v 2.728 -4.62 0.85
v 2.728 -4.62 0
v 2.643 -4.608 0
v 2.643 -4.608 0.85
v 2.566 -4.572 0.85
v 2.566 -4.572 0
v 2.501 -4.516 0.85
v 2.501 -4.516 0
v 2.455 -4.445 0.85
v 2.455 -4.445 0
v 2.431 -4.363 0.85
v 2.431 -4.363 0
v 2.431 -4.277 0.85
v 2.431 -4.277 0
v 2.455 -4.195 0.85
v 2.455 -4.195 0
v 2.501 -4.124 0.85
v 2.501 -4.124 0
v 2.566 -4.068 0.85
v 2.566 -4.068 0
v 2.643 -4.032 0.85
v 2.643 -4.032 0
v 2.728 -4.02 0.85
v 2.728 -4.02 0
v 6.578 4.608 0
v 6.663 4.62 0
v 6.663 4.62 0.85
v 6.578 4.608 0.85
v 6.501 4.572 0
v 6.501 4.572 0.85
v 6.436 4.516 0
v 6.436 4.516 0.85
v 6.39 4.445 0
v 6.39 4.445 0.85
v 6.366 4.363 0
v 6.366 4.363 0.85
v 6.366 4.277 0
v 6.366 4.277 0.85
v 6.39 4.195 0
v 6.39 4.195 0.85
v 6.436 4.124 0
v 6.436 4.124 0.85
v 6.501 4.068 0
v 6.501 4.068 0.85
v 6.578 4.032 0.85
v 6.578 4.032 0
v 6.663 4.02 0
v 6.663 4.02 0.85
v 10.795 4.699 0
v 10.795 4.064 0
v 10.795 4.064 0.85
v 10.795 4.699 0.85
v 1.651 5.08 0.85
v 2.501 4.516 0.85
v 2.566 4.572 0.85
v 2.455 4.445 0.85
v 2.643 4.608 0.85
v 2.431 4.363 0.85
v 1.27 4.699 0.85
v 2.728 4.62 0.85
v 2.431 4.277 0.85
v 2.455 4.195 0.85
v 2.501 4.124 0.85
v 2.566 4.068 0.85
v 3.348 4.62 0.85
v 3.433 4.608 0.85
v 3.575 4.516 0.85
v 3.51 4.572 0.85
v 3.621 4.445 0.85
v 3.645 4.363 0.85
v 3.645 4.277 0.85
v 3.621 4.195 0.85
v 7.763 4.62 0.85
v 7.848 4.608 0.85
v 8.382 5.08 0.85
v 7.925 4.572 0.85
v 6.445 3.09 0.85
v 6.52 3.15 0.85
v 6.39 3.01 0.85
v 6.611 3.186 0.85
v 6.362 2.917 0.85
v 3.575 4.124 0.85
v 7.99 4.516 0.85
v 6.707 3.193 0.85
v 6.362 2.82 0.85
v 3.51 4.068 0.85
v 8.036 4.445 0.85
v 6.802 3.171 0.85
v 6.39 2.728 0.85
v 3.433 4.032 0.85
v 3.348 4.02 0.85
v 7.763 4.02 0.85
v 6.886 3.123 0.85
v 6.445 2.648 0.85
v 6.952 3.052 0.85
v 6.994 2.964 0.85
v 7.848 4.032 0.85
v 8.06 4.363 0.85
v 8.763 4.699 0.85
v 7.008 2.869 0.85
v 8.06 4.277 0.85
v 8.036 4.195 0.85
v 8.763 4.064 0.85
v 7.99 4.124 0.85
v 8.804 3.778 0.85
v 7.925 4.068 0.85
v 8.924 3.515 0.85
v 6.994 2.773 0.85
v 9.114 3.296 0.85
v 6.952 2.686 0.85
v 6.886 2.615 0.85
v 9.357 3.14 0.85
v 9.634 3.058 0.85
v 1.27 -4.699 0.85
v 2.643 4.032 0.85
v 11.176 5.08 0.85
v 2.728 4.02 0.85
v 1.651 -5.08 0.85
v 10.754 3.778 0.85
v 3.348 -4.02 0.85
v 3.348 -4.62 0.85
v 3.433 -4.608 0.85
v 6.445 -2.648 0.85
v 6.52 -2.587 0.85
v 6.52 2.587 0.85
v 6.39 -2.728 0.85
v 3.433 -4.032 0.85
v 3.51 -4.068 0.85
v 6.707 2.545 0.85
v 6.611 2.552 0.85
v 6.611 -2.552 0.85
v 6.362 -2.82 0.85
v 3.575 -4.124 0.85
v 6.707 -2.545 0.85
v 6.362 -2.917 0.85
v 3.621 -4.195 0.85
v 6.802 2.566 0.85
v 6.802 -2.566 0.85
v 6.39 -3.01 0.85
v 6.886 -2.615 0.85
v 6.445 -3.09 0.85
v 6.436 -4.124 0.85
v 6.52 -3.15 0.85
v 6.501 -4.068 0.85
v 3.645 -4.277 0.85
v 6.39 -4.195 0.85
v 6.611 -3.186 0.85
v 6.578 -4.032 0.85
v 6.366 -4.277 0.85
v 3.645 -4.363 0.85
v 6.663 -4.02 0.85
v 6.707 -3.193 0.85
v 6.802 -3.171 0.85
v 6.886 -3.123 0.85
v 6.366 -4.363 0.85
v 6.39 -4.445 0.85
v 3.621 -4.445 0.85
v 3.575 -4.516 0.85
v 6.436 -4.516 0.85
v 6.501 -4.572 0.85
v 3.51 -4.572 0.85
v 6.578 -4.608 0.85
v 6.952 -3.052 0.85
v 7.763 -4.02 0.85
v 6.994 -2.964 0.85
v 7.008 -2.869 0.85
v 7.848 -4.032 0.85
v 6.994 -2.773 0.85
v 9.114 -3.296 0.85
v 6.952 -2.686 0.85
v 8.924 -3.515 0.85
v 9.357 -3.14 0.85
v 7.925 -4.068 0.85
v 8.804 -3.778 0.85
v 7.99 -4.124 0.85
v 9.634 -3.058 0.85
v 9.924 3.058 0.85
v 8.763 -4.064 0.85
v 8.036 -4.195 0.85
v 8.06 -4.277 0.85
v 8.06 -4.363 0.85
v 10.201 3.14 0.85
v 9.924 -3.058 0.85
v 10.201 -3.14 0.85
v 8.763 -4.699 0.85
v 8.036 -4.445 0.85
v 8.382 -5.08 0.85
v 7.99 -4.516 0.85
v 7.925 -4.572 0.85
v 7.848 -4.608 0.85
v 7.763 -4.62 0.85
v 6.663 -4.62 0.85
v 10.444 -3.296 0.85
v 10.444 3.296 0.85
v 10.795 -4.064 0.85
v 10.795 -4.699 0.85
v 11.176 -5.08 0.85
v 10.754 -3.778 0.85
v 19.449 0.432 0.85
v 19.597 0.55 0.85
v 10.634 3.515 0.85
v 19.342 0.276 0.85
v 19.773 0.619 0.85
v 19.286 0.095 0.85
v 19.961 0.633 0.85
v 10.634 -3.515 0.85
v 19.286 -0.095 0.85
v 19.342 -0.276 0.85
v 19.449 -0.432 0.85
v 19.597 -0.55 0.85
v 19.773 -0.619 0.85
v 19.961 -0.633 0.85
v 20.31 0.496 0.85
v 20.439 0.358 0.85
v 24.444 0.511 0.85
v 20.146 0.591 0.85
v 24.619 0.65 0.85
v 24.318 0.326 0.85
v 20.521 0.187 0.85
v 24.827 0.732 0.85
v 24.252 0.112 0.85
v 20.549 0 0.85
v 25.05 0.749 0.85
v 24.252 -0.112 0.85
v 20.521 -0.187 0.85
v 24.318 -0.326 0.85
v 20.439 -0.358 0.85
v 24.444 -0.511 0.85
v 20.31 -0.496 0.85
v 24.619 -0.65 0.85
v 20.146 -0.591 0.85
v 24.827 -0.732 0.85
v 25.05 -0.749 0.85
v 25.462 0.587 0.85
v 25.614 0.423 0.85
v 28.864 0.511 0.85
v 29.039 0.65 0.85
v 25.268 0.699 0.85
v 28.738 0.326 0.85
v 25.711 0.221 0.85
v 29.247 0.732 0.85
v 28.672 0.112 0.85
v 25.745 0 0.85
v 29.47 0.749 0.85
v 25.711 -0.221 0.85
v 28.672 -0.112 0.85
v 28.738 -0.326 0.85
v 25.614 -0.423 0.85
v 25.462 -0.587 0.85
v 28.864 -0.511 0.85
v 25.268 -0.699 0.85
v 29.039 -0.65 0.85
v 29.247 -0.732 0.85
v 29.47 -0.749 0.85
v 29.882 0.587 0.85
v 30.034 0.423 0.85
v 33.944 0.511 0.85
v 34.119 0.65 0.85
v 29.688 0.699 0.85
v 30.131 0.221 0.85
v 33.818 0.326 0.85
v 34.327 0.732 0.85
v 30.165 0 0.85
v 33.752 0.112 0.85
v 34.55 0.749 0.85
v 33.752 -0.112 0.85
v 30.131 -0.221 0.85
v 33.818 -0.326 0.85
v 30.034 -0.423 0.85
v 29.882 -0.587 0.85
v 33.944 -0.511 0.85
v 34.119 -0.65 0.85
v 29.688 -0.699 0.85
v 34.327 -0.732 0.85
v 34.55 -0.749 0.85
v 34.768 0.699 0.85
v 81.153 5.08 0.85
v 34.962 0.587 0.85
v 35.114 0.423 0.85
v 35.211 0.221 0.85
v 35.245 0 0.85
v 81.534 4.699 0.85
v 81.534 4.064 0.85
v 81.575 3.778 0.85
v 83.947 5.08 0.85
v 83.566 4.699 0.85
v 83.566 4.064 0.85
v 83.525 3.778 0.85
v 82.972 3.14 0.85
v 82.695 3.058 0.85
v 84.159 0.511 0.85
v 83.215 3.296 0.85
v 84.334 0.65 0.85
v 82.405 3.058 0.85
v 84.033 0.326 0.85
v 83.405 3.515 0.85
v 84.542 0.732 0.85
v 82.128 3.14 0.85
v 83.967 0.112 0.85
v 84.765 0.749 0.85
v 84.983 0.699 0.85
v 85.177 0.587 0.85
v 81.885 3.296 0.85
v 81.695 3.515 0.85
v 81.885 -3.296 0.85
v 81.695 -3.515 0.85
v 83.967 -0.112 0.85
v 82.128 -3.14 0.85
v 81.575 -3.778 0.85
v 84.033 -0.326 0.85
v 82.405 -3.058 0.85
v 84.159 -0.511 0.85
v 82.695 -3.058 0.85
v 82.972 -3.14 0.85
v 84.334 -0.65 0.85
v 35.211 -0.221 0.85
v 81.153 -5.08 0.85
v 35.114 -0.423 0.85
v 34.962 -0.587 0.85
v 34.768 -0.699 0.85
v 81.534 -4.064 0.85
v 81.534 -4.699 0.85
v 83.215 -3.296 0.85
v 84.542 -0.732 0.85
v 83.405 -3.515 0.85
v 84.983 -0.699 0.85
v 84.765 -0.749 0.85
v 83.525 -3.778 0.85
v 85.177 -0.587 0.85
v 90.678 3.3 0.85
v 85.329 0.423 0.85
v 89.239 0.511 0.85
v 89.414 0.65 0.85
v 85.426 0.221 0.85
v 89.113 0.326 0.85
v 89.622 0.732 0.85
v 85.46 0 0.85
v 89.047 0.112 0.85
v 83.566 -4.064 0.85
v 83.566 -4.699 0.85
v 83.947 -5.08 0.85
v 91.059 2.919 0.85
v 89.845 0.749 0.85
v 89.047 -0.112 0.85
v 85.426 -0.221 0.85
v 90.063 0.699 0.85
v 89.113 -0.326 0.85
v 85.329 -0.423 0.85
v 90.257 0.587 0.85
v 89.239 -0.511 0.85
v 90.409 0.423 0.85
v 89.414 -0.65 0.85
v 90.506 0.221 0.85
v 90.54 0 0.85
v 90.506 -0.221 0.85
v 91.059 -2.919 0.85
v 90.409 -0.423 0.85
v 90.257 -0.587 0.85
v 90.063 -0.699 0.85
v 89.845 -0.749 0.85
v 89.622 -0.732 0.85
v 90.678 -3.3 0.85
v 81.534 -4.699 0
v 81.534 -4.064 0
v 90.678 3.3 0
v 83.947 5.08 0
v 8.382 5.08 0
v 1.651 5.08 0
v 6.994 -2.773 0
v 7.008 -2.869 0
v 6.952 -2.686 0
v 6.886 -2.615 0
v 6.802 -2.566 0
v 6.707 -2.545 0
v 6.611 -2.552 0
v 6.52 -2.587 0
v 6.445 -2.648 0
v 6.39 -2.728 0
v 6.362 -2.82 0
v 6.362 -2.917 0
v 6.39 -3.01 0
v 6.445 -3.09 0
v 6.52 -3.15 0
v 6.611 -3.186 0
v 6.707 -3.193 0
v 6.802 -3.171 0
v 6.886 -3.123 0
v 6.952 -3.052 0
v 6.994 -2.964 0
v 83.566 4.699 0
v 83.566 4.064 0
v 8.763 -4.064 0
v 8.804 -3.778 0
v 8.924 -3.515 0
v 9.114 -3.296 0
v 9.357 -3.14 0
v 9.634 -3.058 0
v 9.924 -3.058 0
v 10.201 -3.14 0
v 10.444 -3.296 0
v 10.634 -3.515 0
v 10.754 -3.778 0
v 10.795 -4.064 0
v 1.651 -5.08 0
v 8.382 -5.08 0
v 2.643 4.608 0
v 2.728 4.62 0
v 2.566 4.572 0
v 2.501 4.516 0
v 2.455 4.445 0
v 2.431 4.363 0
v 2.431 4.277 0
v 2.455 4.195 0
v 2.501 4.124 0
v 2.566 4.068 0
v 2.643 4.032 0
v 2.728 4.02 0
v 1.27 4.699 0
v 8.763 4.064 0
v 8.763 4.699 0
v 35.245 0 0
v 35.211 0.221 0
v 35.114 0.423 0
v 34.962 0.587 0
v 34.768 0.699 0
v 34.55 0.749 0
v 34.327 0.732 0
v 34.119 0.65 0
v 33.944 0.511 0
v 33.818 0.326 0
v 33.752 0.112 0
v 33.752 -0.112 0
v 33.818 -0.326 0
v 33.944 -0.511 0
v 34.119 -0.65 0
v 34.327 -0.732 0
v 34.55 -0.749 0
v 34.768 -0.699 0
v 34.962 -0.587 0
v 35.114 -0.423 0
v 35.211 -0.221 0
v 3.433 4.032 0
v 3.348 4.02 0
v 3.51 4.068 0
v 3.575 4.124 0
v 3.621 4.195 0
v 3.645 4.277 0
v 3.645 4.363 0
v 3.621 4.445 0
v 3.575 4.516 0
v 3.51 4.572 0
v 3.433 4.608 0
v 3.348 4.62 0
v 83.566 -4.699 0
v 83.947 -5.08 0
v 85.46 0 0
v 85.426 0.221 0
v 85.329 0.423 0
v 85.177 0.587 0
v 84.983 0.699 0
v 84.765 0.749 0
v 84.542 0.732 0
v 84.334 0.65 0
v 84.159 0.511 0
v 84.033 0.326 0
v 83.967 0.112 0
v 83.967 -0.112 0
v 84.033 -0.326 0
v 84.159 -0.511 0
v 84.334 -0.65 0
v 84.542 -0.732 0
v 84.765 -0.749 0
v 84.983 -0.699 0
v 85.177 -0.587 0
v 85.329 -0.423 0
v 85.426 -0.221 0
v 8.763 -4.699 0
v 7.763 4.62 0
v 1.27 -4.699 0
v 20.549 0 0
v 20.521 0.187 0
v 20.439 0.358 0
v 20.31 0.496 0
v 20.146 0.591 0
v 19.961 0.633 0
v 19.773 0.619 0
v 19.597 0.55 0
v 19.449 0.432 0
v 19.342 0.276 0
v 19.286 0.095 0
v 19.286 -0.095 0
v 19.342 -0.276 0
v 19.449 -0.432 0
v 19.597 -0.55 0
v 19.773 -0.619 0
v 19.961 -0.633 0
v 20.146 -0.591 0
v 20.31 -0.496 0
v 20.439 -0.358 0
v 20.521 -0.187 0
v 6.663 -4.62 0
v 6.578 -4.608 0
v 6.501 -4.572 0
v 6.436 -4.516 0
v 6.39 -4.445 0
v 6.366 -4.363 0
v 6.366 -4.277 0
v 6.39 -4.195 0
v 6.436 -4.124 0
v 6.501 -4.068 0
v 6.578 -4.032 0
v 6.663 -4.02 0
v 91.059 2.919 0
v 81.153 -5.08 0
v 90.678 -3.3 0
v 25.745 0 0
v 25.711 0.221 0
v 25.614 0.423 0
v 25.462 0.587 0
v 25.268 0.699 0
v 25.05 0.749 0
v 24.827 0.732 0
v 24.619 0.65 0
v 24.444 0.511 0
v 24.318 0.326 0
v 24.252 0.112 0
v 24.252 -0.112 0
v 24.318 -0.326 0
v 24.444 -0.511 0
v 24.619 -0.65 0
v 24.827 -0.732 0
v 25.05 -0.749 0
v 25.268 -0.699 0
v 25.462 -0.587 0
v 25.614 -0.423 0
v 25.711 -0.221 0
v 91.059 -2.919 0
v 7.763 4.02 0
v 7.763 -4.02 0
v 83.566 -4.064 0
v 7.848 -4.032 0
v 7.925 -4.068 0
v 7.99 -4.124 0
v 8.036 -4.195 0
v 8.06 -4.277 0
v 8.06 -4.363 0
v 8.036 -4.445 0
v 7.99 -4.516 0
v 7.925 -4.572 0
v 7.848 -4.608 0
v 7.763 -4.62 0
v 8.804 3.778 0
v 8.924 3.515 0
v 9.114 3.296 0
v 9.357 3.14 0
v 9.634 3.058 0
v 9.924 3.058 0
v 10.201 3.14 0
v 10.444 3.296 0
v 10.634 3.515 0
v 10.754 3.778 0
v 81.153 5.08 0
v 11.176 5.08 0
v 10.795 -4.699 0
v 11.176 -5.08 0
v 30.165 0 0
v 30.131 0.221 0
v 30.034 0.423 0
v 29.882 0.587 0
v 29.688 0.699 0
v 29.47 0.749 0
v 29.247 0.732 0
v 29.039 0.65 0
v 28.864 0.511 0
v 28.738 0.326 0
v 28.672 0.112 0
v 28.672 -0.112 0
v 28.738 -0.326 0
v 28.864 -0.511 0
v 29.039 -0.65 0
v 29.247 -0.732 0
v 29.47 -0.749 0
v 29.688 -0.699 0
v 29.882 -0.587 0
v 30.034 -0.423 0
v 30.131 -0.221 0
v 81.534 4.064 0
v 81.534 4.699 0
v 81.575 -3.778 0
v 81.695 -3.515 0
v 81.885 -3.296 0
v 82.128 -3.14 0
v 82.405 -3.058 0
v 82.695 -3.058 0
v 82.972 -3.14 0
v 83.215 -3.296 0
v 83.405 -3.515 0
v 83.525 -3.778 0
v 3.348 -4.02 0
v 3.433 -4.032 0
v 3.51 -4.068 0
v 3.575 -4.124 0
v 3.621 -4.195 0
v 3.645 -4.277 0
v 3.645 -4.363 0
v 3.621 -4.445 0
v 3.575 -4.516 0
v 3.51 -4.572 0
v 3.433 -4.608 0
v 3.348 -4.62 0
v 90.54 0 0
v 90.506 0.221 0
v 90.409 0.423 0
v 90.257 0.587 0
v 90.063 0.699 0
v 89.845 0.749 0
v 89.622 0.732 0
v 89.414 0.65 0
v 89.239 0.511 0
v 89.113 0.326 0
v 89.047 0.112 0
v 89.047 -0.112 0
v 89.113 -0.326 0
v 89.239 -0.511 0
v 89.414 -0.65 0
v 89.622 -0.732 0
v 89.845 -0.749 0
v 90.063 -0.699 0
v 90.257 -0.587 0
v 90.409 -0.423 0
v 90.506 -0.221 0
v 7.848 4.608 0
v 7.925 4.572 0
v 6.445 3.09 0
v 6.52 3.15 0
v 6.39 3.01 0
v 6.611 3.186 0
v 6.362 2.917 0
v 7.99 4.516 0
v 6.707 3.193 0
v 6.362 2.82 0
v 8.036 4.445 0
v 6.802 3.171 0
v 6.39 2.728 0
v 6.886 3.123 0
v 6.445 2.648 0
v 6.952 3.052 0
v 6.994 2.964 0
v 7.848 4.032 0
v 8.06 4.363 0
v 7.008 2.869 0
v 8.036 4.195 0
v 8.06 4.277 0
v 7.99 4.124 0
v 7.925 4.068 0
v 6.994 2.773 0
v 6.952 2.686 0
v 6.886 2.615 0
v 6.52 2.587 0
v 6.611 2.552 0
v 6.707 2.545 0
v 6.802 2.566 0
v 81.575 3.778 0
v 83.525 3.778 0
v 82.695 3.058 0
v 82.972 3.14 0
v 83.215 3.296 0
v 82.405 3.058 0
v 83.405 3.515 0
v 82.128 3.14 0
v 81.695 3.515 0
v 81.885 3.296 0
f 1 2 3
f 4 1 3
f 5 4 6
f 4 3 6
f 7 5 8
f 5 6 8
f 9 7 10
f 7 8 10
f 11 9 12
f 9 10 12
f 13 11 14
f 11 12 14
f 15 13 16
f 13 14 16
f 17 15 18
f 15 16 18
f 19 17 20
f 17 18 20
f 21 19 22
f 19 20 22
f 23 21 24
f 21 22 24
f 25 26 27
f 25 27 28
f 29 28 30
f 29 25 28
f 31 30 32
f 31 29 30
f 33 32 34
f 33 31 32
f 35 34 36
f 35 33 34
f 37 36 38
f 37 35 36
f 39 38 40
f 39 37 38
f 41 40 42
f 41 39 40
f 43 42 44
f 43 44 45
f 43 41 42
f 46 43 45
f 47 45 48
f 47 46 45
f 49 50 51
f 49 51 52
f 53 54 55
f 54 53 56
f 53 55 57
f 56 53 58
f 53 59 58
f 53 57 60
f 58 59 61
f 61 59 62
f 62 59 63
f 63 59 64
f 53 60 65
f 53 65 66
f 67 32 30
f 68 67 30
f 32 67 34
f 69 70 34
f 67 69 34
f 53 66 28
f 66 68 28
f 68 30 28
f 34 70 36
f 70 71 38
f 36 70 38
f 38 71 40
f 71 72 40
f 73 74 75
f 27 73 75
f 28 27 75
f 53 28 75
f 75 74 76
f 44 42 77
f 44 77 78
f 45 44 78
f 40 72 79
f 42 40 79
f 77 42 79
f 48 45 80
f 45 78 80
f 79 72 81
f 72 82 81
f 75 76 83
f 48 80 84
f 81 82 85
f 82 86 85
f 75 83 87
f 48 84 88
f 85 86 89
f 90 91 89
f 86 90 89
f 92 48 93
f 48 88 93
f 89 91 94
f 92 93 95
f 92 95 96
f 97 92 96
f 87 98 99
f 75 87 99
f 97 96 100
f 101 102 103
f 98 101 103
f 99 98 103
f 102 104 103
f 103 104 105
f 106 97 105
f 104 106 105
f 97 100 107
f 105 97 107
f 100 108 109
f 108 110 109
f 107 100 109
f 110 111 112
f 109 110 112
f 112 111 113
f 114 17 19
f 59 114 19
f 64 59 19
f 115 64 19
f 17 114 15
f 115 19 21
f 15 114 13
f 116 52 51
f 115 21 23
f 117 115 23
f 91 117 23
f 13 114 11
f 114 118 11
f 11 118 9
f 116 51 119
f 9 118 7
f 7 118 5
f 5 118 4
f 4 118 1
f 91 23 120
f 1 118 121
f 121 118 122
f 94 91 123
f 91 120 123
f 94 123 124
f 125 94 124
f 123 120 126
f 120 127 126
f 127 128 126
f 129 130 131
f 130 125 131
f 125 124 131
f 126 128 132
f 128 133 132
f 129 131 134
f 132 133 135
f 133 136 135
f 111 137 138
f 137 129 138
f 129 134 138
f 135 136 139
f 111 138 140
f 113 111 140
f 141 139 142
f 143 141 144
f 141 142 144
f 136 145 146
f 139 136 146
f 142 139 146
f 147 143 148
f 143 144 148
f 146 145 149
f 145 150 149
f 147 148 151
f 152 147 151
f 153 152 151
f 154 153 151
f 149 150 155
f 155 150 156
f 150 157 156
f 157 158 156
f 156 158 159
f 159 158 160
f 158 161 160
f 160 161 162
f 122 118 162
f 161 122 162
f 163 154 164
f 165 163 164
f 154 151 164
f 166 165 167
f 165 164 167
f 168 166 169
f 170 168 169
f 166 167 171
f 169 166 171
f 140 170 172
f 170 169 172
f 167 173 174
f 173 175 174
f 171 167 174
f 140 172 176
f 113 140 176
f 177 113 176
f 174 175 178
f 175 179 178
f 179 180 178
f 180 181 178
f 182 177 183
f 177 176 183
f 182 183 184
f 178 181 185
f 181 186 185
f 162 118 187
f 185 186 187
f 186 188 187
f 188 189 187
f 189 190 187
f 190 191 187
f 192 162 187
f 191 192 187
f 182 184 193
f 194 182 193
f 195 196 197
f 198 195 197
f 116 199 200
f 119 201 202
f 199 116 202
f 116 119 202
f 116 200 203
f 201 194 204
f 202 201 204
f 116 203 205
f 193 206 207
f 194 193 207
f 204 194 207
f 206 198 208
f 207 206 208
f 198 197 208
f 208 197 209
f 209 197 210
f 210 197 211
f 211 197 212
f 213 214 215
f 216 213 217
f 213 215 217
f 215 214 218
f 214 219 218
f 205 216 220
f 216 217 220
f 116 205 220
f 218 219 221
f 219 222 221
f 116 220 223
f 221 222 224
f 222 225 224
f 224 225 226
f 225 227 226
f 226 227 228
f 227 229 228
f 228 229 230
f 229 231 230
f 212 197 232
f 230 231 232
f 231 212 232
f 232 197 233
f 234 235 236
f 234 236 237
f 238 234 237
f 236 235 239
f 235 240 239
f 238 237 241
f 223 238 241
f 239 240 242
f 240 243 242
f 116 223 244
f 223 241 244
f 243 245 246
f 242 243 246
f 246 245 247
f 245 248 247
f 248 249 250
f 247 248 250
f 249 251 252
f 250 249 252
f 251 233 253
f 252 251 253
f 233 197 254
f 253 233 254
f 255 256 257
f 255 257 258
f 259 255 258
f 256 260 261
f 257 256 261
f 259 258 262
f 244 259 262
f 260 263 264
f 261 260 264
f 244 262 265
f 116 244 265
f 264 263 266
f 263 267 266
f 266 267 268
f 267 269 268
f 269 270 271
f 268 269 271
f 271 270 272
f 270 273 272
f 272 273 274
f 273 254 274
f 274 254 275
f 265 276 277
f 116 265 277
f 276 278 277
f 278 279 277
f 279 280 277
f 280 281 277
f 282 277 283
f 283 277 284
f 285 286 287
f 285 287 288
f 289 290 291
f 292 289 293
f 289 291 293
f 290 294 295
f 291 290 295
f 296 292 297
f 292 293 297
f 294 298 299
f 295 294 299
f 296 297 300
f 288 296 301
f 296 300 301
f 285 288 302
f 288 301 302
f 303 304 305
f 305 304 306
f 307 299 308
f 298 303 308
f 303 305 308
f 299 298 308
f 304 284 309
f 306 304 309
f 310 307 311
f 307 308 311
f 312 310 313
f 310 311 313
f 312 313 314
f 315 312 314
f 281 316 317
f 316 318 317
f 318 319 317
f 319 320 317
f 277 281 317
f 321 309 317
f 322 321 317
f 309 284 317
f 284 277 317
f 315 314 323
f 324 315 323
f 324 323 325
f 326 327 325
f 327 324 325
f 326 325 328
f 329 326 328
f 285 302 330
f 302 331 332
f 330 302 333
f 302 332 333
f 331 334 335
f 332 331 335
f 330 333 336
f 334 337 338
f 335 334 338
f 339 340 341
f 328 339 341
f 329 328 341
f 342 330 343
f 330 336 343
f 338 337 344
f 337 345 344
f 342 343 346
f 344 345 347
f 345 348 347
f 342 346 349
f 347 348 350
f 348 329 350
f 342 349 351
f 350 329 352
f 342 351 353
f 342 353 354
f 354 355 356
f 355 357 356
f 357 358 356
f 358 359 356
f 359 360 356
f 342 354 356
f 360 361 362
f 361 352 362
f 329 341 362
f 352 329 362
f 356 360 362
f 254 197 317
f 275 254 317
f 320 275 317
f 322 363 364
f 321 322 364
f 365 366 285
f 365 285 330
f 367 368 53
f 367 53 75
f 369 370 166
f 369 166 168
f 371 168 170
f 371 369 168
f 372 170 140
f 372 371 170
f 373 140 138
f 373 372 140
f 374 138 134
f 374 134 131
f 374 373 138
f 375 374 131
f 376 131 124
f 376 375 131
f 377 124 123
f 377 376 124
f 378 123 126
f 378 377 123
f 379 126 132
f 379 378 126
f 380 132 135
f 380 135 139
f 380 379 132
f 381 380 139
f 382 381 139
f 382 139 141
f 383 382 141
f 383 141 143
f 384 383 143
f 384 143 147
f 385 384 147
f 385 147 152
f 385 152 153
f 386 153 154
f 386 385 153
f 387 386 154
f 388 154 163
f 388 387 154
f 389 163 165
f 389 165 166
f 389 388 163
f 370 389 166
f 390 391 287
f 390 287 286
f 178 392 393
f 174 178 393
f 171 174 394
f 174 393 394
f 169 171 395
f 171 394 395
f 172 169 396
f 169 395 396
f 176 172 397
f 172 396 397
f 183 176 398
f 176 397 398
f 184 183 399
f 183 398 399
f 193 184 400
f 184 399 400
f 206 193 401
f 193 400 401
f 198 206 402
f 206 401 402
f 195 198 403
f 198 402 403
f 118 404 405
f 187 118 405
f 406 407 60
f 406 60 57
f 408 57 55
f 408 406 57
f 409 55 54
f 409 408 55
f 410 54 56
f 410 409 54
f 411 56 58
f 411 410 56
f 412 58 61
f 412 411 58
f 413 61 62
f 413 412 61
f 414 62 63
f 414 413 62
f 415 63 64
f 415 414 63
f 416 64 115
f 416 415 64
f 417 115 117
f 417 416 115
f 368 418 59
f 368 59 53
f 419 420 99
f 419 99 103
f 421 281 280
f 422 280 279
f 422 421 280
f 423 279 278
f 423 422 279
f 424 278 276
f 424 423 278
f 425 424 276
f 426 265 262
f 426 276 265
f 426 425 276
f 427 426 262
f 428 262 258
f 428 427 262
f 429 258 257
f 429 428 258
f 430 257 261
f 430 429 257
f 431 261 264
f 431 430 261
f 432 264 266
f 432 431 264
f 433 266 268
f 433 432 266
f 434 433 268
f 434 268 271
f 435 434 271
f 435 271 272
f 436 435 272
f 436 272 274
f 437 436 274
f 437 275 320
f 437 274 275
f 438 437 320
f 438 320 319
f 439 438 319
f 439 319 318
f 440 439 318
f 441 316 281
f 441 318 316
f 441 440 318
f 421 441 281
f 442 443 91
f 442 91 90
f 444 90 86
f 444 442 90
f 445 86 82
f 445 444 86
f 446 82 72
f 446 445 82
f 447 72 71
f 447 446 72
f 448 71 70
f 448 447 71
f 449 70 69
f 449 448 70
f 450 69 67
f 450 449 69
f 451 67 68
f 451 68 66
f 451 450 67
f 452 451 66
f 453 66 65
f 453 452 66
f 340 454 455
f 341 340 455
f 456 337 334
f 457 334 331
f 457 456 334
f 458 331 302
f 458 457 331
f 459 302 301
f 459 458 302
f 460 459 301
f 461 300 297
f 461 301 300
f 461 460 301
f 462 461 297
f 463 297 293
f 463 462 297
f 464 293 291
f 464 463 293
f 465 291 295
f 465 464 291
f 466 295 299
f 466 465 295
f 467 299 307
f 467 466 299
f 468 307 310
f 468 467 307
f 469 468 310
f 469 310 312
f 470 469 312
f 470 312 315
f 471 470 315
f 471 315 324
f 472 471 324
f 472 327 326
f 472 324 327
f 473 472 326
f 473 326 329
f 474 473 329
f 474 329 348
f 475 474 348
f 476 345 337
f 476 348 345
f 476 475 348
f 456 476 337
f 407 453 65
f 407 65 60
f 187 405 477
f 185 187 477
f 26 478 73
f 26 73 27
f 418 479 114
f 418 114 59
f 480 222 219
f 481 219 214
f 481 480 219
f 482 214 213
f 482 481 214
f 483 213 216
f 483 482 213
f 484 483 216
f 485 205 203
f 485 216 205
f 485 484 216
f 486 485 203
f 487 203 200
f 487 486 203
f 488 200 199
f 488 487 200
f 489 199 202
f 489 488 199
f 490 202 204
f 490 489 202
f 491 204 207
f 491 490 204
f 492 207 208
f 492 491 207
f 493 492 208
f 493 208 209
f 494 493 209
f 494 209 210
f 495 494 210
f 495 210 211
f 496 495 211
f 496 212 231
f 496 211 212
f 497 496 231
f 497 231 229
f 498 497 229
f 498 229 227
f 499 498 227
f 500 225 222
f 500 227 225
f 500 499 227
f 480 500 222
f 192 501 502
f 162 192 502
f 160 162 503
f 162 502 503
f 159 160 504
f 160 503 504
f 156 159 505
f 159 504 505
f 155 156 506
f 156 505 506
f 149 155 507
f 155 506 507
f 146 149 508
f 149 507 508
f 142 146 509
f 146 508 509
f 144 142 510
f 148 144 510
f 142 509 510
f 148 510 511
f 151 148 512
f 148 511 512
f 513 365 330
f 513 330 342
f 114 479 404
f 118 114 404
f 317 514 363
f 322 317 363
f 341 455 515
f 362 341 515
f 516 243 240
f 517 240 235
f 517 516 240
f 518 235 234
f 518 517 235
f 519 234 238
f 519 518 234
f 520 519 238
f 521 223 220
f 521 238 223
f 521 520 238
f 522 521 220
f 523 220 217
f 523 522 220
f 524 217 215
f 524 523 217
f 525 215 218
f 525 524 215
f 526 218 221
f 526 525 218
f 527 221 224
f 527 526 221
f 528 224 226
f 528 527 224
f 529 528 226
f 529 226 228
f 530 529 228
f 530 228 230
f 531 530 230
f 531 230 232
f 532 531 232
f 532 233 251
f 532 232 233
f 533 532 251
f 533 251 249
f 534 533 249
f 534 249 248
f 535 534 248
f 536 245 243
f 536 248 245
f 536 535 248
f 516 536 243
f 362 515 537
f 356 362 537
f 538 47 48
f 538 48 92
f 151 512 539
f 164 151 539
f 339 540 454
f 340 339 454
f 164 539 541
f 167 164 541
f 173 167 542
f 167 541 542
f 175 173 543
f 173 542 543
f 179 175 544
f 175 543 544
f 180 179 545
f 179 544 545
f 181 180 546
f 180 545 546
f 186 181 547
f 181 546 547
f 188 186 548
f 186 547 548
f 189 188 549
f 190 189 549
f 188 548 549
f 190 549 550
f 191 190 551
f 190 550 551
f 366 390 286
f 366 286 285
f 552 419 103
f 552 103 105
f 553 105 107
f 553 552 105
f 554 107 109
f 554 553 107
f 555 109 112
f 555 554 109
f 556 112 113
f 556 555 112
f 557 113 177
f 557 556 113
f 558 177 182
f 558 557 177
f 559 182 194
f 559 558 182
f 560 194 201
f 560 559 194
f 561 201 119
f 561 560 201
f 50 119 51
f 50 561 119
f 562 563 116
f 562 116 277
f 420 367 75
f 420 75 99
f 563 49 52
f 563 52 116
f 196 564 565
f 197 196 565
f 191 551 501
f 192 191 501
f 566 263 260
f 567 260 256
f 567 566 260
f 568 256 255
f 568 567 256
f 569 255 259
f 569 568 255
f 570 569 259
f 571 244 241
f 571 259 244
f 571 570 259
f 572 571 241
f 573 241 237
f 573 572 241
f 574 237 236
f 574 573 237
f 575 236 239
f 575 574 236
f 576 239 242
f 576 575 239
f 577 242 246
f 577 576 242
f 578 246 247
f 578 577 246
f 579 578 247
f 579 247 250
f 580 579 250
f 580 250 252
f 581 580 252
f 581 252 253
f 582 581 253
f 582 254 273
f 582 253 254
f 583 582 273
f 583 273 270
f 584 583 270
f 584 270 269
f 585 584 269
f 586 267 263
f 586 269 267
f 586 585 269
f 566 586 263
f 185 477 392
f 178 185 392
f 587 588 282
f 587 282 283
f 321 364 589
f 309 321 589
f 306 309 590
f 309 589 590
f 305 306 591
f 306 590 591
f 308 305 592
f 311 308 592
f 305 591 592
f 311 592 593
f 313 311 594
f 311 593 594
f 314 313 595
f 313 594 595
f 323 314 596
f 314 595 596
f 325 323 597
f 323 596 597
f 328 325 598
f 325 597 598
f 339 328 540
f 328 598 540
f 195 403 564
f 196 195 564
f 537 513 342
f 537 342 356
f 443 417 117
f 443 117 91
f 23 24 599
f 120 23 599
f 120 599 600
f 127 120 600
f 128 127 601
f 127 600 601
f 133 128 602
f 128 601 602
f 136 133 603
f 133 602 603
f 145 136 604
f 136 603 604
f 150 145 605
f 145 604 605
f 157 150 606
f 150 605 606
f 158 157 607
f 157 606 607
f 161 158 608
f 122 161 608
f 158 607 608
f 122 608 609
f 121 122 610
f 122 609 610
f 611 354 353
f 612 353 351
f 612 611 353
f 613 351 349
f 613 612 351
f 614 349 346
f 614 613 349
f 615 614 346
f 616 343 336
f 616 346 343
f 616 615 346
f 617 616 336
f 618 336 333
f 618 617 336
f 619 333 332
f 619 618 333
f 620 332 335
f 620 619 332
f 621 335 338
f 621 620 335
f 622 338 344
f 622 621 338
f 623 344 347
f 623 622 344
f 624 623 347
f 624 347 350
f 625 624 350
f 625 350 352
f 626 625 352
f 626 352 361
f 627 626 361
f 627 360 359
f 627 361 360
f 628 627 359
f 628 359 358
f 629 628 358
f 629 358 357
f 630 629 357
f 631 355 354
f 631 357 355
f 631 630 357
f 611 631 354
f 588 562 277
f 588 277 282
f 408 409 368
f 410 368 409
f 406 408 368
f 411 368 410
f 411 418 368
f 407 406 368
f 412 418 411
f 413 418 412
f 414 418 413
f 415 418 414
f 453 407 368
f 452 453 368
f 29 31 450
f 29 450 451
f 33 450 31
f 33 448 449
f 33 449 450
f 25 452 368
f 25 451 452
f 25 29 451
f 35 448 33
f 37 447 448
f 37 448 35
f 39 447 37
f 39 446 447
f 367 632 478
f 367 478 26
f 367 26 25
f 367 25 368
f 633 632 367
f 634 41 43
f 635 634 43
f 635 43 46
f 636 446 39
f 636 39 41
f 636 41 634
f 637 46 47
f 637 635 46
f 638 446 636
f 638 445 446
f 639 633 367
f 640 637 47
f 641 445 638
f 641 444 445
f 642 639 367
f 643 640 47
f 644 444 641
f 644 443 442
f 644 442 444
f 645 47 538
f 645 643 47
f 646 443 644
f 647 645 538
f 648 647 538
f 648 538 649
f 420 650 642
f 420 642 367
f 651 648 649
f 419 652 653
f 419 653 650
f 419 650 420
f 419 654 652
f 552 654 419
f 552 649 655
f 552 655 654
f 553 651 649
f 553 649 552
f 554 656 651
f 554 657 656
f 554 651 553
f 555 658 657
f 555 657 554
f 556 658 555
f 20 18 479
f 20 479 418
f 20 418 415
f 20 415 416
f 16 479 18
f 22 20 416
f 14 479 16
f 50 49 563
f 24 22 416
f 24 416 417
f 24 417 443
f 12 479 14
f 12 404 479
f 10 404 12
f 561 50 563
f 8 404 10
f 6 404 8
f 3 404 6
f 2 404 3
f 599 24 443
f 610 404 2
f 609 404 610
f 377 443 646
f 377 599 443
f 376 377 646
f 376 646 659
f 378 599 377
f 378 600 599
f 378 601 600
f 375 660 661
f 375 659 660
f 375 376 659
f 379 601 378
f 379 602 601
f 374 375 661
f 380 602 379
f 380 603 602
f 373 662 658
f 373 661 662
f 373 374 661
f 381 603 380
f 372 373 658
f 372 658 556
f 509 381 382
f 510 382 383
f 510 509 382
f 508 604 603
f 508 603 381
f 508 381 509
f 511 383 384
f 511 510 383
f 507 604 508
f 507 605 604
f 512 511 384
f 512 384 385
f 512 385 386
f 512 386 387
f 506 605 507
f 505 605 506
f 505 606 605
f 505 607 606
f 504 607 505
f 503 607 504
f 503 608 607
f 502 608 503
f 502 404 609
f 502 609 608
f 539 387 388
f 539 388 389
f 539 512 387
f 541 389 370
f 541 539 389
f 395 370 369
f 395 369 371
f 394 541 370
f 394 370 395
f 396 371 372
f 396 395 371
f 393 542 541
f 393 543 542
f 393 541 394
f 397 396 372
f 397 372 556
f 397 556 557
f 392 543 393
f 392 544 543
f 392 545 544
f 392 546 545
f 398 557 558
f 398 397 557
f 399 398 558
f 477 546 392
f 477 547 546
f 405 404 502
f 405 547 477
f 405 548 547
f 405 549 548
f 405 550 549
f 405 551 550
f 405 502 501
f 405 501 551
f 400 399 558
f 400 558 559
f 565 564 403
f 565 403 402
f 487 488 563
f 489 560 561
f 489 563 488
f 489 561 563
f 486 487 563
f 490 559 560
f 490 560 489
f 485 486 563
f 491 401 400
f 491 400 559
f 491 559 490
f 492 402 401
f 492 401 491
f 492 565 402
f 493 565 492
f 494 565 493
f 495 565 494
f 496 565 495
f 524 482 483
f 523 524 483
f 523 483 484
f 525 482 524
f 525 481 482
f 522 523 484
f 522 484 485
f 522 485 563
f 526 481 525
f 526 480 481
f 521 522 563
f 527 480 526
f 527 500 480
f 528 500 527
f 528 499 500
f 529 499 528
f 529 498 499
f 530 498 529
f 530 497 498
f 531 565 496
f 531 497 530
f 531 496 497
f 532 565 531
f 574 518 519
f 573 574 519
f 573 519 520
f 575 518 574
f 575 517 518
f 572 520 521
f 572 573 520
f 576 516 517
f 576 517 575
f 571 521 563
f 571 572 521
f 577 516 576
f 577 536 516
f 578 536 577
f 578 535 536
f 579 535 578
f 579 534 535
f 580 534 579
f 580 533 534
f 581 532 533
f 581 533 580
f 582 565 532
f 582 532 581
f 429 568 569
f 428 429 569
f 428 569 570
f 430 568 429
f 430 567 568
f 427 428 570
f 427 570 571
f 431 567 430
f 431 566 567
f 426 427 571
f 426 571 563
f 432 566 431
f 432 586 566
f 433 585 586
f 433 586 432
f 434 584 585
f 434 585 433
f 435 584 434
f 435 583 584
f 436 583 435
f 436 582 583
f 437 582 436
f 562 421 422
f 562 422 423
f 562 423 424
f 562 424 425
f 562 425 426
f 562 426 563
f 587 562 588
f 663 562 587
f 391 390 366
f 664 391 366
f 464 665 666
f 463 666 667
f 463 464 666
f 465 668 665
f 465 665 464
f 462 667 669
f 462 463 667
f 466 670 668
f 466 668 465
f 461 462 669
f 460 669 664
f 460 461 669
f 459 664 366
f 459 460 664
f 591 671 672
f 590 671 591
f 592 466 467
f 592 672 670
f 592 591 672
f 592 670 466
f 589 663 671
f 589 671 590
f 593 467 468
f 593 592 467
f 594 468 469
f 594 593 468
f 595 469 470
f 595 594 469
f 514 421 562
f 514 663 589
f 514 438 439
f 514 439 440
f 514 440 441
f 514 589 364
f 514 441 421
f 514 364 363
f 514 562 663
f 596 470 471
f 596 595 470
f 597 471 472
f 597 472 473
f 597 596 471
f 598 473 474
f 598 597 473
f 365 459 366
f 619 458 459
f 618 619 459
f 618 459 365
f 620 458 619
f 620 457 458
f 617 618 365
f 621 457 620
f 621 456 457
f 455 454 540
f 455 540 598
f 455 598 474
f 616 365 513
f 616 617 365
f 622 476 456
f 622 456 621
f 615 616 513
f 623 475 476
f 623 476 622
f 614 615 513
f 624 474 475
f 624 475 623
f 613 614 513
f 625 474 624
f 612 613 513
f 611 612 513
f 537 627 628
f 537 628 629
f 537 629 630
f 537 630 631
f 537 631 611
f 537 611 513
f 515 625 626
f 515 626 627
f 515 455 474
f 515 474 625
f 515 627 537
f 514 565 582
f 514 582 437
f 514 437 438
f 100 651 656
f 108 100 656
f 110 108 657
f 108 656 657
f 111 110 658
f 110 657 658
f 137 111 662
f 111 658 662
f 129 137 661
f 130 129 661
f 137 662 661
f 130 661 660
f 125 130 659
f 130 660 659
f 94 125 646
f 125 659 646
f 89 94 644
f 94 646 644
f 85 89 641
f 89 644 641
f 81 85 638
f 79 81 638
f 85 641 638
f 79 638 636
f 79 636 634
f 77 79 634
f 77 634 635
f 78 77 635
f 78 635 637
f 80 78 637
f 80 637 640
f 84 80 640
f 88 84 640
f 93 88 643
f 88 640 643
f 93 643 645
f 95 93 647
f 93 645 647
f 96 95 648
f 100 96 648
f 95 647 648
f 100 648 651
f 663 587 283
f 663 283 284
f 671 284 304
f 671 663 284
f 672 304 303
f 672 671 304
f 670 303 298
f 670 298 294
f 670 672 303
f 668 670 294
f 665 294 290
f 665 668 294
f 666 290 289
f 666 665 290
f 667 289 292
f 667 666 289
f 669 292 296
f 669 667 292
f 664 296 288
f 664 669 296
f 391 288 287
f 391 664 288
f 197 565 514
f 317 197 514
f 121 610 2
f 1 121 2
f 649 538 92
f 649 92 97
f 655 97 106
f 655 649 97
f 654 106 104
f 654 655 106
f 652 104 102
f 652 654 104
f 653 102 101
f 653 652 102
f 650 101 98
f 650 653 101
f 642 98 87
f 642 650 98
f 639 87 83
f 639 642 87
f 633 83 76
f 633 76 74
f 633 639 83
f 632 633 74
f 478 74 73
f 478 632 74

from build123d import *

# Parameters (mm, degrees)
EXTRUDE_1_OUTLINE_R = 0.325
EXTRUDE_1_DEPTH     = 0.85
SKETCH_1_R          = 0.635
SKETCH_1_R_2        = 0.750616105
CUT_EXTRUDE_1_DEPTH = 92.204552414


# Read off the part's stored shape, not the designer's step: 凸台-拉伸1
with BuildPart() as part:
    # 凸台-拉伸1 outline → 凸台-拉伸1 (new body)
    with BuildSketch(Plane.XY):
        with BuildLine():
            Line((81.153, -5.08), (81.534, -4.699))
            Line((81.534, -4.699), (81.534, -4.064))
            ThreePointArc((81.534, -4.064), (82.55, -3.048), (83.566, -4.064))
            Line((83.566, -4.064), (83.566, -4.699))
            Line((83.566, -4.699), (83.947, -5.08))
            Line((83.947, -5.08), (90.678, -3.3))
            Line((90.678, -3.3), (91.059, -2.919))
            Line((91.059, -2.919), (91.059, 0))
            Line((91.059, 0), (1.27, 0))
            Line((1.27, 0), (1.27, -4.699))
            Line((1.27, -4.699), (1.651, -5.08))
            Line((1.651, -5.08), (8.382, -5.08))
            Line((8.382, -5.08), (8.763, -4.699))
            Line((8.763, -4.699), (8.763, -4.064))
            ThreePointArc((8.763, -4.064), (9.779, -3.048), (10.795, -4.064))
            Line((10.795, -4.064), (10.795, -4.699))
            Line((10.795, -4.699), (11.176, -5.08))
            Line((11.176, -5.08), (81.153, -5.08))
        make_face()
        with BuildLine():
            Line((2.728, -4.02), (3.348, -4.02))
            ThreePointArc((3.348, -4.02), (3.648, -4.32), (3.348, -4.62))
            Line((3.348, -4.62), (2.728, -4.62))
            ThreePointArc((2.728, -4.62), (2.428, -4.32), (2.728, -4.02))
        make_face(mode=Mode.SUBTRACT)
        with BuildLine():
            Line((7.763, -4.62), (6.663, -4.62))
            ThreePointArc((6.663, -4.62), (6.363, -4.32), (6.663, -4.02))
            Line((6.663, -4.02), (7.763, -4.02))
            ThreePointArc((7.763, -4.02), (8.063, -4.32), (7.763, -4.62))
        make_face(mode=Mode.SUBTRACT)
        with Locations((6.683, -2.8687)):
            Circle(EXTRUDE_1_OUTLINE_R, mode=Mode.SUBTRACT)
    extrude_1 = extrude(amount=EXTRUDE_1_DEPTH)

    # 镜向1: 凸台-拉伸1 across plane
    add(extrude_1.mirror(Plane(origin=(0, 0, 0.85), x_dir=(0, 0, 1), z_dir=(0, 1, 0))))

    # 草图1 → 切除-拉伸1 (cut, through all)
    with BuildSketch(Plane.XY):
        with Locations((19.914, 0)):
            Circle(SKETCH_1_R)
        with Locations((24.994, 0)):
            Circle(SKETCH_1_R_2)
        with Locations((29.414, 0)):
            Circle(SKETCH_1_R_2)
        with Locations((34.494, 0)):
            Circle(SKETCH_1_R_2)
        with Locations((89.789, 0)):
            Circle(SKETCH_1_R_2)
        with Locations((84.709, 0)):
            Circle(SKETCH_1_R_2)
    extrude(amount=CUT_EXTRUDE_1_DEPTH, mode=Mode.SUBTRACT)


solid = part.part
